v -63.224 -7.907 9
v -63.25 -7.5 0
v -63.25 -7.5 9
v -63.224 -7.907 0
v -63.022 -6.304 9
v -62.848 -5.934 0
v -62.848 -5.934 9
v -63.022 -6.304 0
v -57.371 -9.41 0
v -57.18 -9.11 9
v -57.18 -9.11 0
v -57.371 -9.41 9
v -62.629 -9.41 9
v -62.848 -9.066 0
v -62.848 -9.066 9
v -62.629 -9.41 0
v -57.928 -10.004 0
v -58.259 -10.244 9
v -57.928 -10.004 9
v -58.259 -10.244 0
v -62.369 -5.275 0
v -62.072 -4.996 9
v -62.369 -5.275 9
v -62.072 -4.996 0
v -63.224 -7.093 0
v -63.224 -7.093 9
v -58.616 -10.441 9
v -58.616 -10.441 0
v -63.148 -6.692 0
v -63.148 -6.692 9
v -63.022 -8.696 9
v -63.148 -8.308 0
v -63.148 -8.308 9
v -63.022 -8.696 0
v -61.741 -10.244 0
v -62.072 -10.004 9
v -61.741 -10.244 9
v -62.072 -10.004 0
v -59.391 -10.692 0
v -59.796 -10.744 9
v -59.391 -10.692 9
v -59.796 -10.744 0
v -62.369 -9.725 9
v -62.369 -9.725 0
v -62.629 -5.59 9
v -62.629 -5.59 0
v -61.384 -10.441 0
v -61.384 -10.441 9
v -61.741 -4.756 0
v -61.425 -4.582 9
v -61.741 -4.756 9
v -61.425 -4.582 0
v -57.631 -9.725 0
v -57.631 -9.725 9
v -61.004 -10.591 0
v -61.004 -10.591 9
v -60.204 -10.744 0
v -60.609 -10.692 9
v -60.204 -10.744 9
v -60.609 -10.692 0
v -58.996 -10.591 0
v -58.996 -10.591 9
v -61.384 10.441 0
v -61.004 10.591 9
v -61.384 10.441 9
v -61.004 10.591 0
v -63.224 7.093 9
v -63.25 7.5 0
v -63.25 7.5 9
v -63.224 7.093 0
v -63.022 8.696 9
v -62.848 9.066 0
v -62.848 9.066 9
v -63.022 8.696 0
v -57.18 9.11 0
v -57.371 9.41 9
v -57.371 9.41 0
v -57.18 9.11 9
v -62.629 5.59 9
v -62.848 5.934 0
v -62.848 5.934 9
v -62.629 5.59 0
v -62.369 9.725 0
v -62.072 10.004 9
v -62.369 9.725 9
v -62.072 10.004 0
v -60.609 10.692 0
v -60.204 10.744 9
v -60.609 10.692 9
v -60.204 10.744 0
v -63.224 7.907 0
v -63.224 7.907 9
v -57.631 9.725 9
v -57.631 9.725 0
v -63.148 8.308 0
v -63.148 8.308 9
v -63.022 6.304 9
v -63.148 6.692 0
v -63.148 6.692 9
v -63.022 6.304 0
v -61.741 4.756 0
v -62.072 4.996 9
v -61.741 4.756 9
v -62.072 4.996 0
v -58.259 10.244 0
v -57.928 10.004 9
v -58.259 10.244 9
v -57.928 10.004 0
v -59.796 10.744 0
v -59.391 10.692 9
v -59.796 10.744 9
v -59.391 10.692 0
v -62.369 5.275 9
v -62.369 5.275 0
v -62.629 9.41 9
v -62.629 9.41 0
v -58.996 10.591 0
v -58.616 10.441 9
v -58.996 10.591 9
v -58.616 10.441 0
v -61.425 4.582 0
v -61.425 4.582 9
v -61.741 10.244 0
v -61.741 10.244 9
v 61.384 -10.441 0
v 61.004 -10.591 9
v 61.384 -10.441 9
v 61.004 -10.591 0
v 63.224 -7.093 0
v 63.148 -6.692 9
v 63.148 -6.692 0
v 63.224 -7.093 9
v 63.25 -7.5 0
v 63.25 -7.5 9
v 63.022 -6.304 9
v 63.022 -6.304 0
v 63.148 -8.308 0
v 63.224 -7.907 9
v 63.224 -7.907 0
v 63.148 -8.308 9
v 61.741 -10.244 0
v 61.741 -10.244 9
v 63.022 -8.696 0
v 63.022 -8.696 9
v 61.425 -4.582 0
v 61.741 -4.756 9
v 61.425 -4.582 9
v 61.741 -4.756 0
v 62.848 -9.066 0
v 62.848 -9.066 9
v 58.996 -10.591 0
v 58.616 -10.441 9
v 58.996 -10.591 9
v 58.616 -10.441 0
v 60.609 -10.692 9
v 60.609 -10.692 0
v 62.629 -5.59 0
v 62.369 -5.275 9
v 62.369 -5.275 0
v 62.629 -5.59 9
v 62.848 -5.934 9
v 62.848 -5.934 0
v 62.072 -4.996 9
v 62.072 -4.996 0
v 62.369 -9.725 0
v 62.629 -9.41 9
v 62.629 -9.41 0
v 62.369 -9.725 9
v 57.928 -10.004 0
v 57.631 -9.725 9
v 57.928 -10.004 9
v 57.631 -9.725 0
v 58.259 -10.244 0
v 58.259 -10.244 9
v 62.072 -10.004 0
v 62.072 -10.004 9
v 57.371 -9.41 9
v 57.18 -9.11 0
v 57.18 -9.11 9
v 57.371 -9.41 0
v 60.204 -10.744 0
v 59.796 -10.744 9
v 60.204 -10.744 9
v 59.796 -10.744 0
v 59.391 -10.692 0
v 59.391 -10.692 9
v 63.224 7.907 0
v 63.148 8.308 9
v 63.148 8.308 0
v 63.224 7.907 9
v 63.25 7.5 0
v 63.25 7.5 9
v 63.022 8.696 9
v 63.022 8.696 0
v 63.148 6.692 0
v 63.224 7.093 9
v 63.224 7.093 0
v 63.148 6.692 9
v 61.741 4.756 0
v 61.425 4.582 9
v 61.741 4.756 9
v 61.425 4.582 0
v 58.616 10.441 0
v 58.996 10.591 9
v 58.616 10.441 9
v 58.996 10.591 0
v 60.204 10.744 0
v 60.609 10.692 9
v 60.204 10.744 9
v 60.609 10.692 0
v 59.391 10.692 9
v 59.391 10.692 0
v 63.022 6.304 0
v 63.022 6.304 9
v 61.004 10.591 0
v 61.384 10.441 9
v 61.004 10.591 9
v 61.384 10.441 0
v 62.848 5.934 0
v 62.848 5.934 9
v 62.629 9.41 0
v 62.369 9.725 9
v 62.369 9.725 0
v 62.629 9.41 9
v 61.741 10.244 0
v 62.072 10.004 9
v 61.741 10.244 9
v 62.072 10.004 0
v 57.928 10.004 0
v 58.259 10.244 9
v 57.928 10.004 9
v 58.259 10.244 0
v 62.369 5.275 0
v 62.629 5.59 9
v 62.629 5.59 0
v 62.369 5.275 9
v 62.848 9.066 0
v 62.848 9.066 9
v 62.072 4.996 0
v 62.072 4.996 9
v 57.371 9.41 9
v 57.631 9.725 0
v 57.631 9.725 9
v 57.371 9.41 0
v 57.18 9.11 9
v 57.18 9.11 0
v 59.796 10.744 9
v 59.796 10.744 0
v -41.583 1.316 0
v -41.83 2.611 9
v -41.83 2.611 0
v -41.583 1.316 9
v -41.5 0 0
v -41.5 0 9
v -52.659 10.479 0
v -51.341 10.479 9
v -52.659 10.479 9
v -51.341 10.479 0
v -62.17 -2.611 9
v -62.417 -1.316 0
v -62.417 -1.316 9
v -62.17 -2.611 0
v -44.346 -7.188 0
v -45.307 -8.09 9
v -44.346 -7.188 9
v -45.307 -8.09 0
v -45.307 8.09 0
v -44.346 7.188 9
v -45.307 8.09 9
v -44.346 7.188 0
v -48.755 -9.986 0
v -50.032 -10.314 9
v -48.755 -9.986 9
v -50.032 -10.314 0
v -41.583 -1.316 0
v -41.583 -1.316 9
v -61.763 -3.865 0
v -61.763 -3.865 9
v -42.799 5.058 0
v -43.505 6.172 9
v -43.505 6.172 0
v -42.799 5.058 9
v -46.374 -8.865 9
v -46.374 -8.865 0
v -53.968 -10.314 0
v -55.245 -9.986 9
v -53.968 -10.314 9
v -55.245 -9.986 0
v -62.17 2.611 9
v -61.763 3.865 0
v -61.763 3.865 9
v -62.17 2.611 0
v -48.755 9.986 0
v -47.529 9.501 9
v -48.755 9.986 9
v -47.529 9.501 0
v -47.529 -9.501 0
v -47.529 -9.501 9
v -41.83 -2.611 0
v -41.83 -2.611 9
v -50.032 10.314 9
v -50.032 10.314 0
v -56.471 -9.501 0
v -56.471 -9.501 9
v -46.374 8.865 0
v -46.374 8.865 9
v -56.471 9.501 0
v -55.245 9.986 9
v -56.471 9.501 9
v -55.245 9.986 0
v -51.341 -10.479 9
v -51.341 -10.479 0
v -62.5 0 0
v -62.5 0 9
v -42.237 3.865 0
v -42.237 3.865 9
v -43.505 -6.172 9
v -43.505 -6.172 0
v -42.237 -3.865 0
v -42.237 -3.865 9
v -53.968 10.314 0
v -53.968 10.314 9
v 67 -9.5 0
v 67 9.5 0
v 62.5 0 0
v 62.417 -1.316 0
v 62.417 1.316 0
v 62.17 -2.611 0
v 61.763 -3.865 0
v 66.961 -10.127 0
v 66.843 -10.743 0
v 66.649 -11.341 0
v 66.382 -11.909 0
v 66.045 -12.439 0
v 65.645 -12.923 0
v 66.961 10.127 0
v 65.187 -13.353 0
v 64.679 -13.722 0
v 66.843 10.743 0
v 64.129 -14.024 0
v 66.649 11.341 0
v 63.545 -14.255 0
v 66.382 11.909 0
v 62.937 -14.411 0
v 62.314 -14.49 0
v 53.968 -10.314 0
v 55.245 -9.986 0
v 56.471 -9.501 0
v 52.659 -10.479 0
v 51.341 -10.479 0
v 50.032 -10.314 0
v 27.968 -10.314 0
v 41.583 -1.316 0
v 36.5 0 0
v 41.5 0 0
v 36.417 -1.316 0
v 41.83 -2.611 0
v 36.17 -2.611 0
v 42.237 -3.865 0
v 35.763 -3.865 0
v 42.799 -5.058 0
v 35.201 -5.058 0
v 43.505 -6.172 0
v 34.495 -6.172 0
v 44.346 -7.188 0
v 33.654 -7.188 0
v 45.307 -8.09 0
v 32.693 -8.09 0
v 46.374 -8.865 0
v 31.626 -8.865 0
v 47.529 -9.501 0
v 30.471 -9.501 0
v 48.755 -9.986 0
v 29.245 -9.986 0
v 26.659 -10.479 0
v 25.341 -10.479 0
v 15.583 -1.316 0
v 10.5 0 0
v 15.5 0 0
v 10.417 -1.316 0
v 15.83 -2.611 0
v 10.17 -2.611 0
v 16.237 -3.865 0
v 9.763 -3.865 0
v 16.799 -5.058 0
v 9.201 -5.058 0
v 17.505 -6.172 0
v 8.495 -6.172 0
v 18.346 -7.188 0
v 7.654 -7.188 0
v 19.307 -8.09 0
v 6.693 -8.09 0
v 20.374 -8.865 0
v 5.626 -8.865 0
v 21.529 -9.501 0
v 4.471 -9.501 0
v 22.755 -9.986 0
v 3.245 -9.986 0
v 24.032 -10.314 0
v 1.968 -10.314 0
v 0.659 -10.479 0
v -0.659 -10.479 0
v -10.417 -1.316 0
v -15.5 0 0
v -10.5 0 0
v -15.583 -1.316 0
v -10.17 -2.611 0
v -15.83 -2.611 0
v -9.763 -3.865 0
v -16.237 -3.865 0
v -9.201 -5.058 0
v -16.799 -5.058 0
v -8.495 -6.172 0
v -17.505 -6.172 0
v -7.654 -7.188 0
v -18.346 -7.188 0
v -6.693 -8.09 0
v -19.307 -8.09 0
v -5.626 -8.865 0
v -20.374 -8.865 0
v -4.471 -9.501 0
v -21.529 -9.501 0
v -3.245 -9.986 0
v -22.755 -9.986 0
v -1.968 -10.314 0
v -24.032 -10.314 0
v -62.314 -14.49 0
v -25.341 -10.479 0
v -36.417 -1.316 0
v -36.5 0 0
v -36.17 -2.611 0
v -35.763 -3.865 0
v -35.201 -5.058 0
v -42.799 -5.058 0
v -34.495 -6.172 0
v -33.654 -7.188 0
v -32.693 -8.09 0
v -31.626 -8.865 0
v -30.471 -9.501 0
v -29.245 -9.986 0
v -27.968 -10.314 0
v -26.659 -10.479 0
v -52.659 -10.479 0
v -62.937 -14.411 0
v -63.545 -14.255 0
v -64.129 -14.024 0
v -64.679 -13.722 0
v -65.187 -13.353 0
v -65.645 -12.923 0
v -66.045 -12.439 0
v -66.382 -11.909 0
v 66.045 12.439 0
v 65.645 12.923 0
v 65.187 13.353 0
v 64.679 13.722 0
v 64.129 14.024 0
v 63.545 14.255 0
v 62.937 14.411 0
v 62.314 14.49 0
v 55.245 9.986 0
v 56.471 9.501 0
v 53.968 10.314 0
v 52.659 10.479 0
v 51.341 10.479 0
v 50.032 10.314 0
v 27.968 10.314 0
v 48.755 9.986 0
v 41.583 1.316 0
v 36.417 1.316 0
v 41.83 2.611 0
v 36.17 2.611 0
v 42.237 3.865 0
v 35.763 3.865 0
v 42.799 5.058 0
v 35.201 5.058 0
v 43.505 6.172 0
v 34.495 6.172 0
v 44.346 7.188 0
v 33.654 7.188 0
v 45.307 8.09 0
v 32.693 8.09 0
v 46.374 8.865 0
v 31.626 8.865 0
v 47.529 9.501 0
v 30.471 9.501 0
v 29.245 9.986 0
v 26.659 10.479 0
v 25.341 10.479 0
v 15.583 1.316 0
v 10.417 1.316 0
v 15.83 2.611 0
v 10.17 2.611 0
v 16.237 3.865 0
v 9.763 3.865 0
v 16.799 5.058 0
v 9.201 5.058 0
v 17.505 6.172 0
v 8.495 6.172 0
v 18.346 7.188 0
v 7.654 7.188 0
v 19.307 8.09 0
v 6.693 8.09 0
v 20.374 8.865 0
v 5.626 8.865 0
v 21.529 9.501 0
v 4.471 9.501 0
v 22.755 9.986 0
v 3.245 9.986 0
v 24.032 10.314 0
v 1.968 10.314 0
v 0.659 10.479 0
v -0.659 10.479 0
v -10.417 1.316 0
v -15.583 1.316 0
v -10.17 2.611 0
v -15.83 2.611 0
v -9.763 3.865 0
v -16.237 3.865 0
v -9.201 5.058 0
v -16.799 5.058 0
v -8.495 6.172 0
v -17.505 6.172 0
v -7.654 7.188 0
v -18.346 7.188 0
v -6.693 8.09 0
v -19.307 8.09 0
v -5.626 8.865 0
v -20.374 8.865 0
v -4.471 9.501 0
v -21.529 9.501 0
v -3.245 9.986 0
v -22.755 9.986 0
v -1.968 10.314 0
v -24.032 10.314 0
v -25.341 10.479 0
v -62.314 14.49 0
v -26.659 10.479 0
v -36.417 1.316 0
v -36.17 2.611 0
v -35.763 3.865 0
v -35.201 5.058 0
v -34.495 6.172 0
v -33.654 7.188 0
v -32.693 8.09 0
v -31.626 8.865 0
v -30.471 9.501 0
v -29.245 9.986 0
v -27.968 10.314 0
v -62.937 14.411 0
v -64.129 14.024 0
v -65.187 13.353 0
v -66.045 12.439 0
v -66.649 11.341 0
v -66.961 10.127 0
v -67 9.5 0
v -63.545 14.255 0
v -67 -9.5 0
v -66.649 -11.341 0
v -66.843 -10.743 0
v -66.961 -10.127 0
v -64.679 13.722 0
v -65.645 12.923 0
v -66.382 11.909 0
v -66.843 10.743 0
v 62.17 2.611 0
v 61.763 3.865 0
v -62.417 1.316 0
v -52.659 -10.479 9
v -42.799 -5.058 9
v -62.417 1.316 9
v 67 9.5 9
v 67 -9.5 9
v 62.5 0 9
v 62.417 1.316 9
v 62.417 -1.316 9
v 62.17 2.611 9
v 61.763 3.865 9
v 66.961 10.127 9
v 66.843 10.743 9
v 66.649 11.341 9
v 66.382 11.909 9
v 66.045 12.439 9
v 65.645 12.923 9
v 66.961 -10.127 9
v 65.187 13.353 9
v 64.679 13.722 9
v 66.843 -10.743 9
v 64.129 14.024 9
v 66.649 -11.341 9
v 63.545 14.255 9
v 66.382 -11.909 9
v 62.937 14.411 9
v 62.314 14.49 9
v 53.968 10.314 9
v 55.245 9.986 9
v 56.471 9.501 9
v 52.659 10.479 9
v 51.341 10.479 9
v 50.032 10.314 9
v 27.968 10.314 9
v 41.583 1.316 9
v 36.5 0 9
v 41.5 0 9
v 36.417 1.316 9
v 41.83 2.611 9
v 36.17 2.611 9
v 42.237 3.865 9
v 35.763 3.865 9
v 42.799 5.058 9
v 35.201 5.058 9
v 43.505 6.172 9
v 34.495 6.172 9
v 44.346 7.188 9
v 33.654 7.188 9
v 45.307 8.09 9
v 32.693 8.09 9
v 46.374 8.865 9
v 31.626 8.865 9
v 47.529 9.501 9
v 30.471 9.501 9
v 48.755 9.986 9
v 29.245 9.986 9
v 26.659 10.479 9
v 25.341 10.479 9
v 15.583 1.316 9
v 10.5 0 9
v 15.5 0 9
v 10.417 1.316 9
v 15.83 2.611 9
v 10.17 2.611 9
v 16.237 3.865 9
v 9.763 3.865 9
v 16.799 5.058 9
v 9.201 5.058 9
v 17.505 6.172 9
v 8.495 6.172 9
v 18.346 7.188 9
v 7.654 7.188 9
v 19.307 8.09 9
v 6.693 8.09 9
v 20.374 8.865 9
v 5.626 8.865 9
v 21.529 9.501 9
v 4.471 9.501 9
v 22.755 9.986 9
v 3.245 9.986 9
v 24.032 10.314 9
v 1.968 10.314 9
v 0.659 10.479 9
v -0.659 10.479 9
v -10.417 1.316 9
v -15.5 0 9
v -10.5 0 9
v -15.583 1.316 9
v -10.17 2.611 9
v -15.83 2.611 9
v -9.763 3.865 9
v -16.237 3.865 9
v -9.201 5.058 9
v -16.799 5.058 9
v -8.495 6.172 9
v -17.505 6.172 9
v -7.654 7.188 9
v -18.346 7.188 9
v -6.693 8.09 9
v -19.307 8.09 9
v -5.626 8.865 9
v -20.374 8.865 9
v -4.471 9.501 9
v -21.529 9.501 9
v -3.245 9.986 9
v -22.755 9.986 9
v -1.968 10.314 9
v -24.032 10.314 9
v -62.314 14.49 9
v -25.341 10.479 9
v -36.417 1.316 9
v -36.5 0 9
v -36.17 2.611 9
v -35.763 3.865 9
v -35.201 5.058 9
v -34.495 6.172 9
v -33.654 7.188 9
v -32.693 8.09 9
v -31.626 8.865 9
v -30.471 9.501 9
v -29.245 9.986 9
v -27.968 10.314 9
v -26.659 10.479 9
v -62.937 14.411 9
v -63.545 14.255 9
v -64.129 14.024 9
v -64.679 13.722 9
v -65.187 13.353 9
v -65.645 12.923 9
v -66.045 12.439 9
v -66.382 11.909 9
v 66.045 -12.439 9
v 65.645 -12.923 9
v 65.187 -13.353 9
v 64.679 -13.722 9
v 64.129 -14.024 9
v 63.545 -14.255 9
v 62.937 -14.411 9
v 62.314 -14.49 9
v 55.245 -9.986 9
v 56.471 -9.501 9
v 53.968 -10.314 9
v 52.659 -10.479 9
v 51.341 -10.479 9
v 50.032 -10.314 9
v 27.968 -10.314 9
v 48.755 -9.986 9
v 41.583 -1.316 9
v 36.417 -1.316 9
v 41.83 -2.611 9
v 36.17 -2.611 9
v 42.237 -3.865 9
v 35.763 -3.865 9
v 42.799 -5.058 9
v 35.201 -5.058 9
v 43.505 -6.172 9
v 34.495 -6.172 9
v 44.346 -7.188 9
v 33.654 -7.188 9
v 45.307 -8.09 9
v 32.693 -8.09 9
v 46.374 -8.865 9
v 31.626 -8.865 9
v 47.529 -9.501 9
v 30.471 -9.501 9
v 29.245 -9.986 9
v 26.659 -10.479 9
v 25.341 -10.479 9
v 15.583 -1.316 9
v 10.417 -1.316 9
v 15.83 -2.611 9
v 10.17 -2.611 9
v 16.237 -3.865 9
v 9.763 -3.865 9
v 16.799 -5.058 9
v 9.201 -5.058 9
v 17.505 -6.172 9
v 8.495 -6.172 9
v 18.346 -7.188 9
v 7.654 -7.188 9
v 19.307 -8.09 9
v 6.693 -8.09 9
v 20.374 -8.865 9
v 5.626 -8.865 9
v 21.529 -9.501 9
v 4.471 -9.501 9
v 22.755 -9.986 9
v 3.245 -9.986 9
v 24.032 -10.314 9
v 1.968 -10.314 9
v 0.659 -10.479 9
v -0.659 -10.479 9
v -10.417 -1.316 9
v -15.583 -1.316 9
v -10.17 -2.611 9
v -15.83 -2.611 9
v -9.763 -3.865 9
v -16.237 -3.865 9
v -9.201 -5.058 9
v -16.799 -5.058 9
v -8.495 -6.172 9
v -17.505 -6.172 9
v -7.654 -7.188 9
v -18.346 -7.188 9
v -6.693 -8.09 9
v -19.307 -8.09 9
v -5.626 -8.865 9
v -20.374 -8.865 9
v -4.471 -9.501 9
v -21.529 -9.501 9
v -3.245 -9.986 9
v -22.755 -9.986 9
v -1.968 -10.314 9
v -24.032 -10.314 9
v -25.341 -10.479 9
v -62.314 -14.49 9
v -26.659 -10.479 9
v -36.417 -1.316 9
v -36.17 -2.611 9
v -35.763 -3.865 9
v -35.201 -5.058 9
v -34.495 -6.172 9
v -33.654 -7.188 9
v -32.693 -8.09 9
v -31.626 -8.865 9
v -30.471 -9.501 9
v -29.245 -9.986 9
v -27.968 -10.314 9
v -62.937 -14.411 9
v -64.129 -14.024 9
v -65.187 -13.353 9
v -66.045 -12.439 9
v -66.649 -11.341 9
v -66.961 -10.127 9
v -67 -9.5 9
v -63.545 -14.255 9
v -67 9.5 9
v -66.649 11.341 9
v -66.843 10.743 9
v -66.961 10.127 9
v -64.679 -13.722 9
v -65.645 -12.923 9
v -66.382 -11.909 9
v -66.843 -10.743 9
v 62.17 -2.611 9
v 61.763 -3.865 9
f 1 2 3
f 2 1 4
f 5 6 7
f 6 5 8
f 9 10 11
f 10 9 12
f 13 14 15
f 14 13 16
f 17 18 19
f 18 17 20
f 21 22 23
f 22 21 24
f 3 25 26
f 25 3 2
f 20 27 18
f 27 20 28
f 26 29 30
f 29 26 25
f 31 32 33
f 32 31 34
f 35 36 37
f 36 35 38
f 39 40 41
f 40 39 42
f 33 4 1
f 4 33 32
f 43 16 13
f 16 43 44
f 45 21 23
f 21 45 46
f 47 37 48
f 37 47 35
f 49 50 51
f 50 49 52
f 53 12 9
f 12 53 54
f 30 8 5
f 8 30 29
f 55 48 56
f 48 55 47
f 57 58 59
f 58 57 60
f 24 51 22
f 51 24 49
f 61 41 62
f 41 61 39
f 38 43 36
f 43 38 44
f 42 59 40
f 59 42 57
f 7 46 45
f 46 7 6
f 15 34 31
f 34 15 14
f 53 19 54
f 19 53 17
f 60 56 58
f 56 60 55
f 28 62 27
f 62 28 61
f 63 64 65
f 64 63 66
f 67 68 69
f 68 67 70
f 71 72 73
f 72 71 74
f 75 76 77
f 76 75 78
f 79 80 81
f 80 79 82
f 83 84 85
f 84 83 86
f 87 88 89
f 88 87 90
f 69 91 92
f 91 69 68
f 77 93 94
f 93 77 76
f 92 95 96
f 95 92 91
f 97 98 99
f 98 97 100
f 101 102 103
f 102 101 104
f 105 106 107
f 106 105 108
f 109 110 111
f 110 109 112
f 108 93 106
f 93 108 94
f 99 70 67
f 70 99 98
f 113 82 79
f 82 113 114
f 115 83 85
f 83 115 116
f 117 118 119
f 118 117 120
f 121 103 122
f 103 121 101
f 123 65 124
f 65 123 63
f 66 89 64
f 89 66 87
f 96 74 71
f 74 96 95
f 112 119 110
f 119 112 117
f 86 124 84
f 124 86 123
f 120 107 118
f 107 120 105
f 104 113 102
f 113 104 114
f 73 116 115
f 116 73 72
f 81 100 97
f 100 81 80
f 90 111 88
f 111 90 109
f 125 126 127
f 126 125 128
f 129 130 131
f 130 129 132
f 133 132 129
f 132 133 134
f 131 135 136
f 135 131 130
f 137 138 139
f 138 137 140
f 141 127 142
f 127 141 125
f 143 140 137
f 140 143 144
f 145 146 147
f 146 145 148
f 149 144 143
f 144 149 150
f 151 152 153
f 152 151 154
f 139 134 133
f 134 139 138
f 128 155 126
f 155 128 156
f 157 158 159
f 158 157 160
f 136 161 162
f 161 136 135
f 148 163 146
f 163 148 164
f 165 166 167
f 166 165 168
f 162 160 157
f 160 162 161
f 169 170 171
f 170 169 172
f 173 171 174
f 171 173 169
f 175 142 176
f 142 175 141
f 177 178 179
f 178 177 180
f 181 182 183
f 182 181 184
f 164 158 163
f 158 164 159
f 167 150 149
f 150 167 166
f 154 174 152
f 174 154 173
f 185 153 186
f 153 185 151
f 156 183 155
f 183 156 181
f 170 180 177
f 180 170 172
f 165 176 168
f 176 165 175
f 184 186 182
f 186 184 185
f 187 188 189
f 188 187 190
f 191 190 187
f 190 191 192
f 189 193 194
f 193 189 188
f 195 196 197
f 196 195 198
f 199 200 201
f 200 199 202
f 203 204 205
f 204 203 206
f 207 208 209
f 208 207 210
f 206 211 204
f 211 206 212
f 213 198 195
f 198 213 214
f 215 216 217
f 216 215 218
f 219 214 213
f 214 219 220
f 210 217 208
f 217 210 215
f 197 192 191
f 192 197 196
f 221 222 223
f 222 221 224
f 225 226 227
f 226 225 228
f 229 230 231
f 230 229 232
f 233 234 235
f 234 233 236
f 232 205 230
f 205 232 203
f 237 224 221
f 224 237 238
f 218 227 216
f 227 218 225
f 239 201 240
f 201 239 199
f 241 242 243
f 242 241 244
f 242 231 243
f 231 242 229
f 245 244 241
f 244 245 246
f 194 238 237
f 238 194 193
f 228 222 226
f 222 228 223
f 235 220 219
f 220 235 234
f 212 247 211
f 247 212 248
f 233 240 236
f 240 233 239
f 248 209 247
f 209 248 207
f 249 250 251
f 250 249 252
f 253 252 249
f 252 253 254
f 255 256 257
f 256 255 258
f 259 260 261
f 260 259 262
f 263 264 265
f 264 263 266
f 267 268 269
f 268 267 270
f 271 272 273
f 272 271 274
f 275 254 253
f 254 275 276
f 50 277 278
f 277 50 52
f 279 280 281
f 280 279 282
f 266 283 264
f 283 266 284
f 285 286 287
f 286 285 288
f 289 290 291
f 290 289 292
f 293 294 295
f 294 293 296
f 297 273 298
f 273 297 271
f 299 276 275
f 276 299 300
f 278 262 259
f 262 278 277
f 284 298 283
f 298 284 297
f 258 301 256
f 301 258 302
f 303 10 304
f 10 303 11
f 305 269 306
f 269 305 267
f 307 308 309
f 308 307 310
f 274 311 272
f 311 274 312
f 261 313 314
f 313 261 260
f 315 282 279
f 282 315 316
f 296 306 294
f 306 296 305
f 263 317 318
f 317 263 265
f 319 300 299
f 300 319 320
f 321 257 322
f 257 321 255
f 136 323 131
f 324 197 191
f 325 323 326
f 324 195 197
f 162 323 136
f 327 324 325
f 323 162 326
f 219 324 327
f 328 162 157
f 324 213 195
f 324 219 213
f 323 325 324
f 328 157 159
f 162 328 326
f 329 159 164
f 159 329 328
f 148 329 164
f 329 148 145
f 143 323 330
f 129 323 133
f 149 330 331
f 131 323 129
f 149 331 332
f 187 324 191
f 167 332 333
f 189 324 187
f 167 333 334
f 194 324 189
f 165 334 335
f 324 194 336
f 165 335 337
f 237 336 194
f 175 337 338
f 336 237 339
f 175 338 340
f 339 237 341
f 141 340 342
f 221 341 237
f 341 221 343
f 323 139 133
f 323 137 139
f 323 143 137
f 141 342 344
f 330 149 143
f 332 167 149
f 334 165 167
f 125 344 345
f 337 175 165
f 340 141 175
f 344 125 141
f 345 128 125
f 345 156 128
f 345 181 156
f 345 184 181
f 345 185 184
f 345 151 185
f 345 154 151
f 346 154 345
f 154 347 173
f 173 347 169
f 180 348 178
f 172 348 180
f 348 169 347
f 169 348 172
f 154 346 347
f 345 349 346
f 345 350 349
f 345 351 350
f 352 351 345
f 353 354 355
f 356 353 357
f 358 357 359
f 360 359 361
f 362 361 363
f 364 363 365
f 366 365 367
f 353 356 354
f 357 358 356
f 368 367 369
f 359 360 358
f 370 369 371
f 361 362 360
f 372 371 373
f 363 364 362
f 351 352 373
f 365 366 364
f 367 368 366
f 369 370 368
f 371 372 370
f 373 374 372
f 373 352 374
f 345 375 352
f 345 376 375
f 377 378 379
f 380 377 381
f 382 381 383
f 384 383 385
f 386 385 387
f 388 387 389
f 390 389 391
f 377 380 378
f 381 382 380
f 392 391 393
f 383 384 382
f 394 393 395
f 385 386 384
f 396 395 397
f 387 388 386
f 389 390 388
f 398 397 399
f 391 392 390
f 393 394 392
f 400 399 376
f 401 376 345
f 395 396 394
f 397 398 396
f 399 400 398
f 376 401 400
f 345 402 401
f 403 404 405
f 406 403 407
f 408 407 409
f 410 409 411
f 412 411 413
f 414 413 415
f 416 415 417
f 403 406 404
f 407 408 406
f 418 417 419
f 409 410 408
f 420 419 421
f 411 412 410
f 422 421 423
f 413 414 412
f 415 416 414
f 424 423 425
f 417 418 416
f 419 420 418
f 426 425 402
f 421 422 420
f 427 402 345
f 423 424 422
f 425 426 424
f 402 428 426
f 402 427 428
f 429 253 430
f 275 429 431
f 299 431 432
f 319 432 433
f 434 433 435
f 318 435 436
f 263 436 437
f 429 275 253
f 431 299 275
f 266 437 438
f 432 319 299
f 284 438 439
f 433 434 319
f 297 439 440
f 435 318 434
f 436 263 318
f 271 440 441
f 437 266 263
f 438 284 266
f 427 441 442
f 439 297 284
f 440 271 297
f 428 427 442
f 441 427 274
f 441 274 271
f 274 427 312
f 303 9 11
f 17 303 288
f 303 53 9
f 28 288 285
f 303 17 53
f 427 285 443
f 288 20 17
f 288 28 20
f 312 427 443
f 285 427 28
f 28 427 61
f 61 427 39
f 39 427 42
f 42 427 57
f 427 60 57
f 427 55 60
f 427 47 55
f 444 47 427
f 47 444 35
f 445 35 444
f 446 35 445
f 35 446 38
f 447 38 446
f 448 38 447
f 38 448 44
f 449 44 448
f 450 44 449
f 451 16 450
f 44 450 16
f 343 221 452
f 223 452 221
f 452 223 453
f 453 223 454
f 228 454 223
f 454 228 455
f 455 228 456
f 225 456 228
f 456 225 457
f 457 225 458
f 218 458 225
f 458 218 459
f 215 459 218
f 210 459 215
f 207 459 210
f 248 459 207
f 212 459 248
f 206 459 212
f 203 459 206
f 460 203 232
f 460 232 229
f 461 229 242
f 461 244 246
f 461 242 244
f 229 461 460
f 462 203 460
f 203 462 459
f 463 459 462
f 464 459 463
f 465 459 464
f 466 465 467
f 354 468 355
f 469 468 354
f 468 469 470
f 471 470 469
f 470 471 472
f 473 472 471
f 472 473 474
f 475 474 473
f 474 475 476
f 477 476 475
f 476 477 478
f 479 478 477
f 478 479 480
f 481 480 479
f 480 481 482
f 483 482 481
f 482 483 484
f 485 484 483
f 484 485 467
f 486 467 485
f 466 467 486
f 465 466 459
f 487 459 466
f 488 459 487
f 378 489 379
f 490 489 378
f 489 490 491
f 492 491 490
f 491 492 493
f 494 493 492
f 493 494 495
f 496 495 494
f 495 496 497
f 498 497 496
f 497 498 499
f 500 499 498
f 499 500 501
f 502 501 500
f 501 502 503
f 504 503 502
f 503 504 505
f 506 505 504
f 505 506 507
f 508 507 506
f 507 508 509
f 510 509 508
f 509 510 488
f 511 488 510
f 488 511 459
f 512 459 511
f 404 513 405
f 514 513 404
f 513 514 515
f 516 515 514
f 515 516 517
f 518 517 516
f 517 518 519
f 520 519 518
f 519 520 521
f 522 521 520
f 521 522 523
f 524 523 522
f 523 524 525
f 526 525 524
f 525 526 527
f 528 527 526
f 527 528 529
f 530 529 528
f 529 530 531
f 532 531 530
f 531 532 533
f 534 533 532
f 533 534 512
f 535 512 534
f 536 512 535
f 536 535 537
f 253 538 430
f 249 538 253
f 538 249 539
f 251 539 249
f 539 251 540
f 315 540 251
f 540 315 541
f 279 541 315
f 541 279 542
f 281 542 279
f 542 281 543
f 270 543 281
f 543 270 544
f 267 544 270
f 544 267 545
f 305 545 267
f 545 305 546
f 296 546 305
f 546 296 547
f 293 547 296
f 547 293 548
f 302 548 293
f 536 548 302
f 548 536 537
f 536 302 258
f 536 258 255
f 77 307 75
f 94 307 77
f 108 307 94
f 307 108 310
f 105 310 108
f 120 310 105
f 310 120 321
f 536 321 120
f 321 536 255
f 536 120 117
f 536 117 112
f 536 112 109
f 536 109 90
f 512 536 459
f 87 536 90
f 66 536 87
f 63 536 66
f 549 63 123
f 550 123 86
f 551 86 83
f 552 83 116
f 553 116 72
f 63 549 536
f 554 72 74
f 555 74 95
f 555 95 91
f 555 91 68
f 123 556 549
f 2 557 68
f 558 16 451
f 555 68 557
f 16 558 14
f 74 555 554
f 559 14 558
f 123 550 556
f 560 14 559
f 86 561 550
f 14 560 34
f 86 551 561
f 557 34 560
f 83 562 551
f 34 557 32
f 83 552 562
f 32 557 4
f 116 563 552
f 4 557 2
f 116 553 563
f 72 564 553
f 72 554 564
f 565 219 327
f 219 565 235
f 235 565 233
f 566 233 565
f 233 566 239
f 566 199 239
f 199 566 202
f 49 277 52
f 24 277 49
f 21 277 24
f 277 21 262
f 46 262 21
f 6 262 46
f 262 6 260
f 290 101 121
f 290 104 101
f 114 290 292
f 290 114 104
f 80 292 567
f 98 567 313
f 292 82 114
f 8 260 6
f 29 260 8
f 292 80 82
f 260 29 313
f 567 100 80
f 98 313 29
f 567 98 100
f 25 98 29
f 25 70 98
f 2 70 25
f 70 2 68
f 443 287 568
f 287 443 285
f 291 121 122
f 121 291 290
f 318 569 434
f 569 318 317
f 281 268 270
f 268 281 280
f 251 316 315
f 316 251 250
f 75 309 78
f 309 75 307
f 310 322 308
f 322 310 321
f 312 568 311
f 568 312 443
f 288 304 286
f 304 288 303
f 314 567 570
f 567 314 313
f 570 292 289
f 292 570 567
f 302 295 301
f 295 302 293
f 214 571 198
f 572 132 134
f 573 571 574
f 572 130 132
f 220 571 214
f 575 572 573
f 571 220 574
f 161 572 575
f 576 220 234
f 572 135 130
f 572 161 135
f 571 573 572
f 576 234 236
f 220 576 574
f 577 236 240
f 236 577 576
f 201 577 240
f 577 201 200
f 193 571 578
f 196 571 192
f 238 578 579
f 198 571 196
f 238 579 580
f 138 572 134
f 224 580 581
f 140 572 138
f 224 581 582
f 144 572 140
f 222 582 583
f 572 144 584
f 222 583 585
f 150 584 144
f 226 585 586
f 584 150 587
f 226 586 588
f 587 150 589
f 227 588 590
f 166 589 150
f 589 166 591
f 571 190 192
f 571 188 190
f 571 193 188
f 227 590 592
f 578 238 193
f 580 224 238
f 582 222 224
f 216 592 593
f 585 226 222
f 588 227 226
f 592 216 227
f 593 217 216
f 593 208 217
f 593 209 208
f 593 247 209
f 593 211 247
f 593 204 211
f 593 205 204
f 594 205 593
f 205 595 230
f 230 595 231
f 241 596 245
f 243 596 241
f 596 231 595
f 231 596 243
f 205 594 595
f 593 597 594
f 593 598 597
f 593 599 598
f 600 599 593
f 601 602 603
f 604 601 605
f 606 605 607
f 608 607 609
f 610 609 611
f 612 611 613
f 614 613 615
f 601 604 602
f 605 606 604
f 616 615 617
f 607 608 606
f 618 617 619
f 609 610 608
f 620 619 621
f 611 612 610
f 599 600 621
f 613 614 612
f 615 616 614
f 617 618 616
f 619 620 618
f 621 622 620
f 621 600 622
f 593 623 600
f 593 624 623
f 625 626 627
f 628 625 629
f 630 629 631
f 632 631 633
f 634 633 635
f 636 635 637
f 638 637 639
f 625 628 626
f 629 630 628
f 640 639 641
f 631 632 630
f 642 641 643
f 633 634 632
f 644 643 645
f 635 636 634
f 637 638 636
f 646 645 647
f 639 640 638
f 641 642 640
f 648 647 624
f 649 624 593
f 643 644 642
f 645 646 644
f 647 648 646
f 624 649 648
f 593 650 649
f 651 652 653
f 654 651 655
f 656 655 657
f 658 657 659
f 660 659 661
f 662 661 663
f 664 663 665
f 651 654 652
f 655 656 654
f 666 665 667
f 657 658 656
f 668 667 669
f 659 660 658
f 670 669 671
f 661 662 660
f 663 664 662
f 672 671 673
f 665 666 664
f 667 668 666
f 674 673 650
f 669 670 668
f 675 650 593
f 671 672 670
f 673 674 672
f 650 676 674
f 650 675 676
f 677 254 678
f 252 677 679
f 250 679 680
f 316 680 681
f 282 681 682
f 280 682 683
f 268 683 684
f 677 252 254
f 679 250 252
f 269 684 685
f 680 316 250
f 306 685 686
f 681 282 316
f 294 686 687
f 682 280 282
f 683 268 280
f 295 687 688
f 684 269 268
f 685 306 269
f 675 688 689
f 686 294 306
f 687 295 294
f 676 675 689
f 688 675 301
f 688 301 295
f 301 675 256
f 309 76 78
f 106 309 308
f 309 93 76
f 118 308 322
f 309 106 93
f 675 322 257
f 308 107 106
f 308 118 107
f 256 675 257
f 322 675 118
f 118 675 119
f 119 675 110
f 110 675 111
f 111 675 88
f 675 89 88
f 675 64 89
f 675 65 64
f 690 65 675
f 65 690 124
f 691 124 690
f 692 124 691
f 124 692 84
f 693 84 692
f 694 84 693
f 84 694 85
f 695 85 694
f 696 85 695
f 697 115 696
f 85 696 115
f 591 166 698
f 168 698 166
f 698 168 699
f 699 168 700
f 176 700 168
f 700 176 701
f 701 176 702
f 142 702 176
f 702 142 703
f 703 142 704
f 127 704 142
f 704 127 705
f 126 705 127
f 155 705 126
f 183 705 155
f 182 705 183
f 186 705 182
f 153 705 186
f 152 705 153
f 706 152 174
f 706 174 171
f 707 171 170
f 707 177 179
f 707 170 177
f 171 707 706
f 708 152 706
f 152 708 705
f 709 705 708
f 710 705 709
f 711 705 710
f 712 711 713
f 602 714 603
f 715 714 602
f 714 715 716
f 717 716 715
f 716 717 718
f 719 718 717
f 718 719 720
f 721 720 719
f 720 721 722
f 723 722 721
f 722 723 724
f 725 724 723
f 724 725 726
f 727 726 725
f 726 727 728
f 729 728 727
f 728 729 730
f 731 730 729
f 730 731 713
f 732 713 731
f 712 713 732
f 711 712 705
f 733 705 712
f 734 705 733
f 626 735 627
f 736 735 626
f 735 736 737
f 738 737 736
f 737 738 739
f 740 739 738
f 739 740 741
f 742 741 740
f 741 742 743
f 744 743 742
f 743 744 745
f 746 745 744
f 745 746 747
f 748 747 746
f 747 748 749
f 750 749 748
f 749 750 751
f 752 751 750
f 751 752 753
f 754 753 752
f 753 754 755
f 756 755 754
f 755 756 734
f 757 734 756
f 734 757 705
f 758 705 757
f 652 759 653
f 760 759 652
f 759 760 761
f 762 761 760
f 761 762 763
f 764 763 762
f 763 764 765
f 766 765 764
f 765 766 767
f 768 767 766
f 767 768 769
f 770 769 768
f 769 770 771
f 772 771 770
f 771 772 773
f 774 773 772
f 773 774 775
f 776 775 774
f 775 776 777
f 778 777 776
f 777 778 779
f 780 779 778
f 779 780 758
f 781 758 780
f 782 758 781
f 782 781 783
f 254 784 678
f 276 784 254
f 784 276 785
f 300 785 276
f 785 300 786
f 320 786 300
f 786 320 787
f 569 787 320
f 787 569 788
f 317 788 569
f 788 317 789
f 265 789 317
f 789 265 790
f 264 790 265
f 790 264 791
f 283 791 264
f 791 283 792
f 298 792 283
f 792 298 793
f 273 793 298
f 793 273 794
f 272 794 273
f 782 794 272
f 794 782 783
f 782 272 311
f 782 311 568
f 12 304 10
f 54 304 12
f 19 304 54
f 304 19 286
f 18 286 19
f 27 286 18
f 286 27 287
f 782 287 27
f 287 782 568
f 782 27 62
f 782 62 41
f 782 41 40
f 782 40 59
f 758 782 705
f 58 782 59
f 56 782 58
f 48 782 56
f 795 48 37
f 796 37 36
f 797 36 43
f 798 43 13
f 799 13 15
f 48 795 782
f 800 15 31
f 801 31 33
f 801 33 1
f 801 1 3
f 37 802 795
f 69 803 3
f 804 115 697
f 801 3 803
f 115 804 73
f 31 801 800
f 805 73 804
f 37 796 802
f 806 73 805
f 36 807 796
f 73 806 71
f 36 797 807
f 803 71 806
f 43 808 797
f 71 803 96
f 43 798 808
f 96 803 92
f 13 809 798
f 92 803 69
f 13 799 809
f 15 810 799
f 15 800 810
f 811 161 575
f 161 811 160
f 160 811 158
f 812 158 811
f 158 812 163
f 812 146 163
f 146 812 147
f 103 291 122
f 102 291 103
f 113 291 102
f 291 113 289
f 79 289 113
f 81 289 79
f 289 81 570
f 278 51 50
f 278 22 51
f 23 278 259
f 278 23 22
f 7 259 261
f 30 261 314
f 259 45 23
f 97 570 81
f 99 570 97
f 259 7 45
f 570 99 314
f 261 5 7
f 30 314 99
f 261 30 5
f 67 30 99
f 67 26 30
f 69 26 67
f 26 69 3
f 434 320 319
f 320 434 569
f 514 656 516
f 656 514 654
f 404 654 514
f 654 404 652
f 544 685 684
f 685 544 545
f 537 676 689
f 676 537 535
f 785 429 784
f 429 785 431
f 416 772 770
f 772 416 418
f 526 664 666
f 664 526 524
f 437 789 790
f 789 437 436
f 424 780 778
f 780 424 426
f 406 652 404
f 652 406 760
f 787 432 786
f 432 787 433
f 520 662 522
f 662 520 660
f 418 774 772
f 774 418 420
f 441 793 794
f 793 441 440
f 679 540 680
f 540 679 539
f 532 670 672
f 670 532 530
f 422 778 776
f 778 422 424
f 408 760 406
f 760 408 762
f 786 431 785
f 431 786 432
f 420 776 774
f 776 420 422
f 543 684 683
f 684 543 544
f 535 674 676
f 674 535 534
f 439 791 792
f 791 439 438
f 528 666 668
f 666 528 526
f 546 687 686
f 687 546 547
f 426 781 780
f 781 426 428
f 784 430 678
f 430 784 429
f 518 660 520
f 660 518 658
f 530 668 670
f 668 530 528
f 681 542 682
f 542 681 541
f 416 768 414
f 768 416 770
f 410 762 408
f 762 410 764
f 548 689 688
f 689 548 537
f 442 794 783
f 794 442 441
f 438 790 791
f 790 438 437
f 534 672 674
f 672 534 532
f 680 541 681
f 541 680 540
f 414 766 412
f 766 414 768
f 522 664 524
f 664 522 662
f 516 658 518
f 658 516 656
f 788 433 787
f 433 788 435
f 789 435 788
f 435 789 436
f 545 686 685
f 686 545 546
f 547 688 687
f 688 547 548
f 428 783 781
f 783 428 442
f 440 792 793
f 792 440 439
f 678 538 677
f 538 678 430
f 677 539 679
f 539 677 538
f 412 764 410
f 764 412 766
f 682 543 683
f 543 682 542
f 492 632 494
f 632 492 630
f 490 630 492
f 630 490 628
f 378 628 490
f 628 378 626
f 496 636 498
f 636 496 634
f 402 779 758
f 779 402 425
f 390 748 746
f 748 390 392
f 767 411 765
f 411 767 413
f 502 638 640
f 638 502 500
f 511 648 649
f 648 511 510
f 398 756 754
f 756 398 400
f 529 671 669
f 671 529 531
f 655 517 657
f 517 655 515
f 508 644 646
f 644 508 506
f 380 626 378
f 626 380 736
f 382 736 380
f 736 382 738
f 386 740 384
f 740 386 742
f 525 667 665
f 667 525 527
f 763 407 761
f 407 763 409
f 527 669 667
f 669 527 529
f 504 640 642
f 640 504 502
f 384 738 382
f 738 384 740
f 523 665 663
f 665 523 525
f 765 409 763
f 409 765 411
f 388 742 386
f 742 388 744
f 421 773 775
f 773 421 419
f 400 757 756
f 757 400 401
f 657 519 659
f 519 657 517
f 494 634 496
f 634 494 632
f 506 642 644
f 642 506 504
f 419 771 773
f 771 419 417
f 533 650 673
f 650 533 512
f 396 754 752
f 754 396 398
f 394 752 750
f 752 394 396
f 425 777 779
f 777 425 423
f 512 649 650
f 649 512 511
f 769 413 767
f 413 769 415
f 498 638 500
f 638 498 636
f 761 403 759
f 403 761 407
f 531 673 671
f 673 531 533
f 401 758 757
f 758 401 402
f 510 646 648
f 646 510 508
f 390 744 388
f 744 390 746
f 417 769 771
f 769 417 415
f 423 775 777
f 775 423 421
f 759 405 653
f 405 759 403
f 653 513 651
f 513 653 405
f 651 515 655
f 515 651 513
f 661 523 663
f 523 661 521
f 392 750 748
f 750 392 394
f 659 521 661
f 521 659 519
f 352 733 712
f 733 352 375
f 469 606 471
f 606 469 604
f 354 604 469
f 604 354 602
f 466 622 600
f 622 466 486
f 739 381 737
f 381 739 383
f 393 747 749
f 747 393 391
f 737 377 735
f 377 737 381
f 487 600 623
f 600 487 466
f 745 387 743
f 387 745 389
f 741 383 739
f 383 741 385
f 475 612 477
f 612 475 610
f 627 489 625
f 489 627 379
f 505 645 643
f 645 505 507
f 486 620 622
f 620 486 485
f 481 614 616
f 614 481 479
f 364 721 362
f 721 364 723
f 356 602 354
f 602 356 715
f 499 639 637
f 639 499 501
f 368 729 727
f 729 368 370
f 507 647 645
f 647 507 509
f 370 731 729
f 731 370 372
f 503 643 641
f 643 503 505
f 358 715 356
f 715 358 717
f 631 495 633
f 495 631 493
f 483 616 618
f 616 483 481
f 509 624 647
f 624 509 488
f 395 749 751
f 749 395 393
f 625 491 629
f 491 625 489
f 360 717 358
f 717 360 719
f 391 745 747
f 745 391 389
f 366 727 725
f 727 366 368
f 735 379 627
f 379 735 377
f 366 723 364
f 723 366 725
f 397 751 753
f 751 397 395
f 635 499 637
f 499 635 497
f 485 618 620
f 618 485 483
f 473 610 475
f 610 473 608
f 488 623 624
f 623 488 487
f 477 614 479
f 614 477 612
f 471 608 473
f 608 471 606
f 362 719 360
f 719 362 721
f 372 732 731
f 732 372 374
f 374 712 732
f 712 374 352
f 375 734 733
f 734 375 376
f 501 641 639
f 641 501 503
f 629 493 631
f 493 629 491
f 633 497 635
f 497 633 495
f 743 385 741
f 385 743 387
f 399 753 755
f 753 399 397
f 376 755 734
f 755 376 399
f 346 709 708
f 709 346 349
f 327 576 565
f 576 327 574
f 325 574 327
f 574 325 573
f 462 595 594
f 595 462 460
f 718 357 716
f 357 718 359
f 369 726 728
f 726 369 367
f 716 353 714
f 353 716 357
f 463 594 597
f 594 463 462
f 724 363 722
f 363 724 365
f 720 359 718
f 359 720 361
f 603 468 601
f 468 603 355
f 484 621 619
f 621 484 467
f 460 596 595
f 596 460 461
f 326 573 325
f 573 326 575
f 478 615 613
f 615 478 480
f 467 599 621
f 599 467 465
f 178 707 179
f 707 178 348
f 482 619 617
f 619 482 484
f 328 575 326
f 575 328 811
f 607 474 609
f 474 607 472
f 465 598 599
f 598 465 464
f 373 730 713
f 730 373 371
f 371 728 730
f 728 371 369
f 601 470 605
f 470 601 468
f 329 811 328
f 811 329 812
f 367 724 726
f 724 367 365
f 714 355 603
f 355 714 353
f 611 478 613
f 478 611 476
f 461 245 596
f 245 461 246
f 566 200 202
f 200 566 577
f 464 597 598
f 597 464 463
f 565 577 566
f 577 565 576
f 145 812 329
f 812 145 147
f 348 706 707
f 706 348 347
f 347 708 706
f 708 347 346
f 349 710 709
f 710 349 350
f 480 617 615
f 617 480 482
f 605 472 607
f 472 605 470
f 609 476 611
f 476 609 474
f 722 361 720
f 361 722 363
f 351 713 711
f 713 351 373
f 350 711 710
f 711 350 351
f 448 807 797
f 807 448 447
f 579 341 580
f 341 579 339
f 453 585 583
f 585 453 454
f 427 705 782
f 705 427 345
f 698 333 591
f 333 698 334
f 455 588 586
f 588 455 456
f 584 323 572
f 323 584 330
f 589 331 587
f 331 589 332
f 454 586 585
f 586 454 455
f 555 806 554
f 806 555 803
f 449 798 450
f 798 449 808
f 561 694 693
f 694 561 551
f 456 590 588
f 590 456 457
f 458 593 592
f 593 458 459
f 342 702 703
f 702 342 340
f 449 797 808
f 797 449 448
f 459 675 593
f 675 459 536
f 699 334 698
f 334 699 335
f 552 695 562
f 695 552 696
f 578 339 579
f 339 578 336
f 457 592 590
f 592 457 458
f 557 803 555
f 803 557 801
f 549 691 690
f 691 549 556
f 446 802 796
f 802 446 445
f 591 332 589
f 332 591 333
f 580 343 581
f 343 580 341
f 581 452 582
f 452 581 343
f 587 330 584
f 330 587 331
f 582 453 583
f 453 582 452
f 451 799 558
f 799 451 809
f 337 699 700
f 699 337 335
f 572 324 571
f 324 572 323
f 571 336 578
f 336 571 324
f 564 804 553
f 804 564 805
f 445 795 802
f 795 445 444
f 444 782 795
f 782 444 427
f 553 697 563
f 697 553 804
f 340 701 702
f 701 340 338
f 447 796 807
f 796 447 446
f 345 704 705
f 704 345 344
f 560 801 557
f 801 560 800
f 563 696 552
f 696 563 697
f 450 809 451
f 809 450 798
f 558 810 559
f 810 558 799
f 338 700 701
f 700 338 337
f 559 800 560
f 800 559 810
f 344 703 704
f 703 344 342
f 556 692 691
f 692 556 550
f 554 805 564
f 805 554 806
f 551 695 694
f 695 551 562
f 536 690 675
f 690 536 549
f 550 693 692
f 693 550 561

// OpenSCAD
$fn = 50;

difference() {
	union() {
		hull() {
			translate(v = [-62.0, 9.5, 0]) {
				cylinder(h = 9, r = 5);
			}
			translate(v = [62.0, 9.5, 0]) {
				cylinder(h = 9, r = 5);
			}
			translate(v = [-62.0, -9.5, 0]) {
				cylinder(h = 9, r = 5);
			}
			translate(v = [62.0, -9.5, 0]) {
				cylinder(h = 9, r = 5);
			}
		}
	}
	union() {
		translate(v = [-60.0, -7.5, -100.0]) {
			cylinder(h = 200, r = 3.25);
		}
		translate(v = [-60.0, 7.5, -100.0]) {
			cylinder(h = 200, r = 3.25);
		}
		translate(v = [60.0, -7.5, -100.0]) {
			cylinder(h = 200, r = 3.25);
		}
		translate(v = [60.0, 7.5, -100.0]) {
			cylinder(h = 200, r = 3.25);
		}
		translate(v = [-60.0, -7.5, -100.0]) {
			cylinder(h = 200, r = 1.8);
		}
		translate(v = [-60.0, 7.5, -100.0]) {
			cylinder(h = 200, r = 1.8);
		}
		translate(v = [60.0, -7.5, -100.0]) {
			cylinder(h = 200, r = 1.8);
		}
		translate(v = [60.0, 7.5, -100.0]) {
			cylinder(h = 200, r = 1.8);
		}
		translate(v = [-52.0, 0, 0.0]) {
			cylinder(h = 9, r = 10.5);
		}
		translate(v = [-26.0, 0, 0.0]) {
			cylinder(h = 9, r = 10.5);
		}
		cylinder(h = 9, r = 10.5);
		translate(v = [26.0, 0, 0.0]) {
			cylinder(h = 9, r = 10.5);
		}
		translate(v = [52.0, 0, 0.0]) {
			cylinder(h = 9, r = 10.5);
		}
	}
}
